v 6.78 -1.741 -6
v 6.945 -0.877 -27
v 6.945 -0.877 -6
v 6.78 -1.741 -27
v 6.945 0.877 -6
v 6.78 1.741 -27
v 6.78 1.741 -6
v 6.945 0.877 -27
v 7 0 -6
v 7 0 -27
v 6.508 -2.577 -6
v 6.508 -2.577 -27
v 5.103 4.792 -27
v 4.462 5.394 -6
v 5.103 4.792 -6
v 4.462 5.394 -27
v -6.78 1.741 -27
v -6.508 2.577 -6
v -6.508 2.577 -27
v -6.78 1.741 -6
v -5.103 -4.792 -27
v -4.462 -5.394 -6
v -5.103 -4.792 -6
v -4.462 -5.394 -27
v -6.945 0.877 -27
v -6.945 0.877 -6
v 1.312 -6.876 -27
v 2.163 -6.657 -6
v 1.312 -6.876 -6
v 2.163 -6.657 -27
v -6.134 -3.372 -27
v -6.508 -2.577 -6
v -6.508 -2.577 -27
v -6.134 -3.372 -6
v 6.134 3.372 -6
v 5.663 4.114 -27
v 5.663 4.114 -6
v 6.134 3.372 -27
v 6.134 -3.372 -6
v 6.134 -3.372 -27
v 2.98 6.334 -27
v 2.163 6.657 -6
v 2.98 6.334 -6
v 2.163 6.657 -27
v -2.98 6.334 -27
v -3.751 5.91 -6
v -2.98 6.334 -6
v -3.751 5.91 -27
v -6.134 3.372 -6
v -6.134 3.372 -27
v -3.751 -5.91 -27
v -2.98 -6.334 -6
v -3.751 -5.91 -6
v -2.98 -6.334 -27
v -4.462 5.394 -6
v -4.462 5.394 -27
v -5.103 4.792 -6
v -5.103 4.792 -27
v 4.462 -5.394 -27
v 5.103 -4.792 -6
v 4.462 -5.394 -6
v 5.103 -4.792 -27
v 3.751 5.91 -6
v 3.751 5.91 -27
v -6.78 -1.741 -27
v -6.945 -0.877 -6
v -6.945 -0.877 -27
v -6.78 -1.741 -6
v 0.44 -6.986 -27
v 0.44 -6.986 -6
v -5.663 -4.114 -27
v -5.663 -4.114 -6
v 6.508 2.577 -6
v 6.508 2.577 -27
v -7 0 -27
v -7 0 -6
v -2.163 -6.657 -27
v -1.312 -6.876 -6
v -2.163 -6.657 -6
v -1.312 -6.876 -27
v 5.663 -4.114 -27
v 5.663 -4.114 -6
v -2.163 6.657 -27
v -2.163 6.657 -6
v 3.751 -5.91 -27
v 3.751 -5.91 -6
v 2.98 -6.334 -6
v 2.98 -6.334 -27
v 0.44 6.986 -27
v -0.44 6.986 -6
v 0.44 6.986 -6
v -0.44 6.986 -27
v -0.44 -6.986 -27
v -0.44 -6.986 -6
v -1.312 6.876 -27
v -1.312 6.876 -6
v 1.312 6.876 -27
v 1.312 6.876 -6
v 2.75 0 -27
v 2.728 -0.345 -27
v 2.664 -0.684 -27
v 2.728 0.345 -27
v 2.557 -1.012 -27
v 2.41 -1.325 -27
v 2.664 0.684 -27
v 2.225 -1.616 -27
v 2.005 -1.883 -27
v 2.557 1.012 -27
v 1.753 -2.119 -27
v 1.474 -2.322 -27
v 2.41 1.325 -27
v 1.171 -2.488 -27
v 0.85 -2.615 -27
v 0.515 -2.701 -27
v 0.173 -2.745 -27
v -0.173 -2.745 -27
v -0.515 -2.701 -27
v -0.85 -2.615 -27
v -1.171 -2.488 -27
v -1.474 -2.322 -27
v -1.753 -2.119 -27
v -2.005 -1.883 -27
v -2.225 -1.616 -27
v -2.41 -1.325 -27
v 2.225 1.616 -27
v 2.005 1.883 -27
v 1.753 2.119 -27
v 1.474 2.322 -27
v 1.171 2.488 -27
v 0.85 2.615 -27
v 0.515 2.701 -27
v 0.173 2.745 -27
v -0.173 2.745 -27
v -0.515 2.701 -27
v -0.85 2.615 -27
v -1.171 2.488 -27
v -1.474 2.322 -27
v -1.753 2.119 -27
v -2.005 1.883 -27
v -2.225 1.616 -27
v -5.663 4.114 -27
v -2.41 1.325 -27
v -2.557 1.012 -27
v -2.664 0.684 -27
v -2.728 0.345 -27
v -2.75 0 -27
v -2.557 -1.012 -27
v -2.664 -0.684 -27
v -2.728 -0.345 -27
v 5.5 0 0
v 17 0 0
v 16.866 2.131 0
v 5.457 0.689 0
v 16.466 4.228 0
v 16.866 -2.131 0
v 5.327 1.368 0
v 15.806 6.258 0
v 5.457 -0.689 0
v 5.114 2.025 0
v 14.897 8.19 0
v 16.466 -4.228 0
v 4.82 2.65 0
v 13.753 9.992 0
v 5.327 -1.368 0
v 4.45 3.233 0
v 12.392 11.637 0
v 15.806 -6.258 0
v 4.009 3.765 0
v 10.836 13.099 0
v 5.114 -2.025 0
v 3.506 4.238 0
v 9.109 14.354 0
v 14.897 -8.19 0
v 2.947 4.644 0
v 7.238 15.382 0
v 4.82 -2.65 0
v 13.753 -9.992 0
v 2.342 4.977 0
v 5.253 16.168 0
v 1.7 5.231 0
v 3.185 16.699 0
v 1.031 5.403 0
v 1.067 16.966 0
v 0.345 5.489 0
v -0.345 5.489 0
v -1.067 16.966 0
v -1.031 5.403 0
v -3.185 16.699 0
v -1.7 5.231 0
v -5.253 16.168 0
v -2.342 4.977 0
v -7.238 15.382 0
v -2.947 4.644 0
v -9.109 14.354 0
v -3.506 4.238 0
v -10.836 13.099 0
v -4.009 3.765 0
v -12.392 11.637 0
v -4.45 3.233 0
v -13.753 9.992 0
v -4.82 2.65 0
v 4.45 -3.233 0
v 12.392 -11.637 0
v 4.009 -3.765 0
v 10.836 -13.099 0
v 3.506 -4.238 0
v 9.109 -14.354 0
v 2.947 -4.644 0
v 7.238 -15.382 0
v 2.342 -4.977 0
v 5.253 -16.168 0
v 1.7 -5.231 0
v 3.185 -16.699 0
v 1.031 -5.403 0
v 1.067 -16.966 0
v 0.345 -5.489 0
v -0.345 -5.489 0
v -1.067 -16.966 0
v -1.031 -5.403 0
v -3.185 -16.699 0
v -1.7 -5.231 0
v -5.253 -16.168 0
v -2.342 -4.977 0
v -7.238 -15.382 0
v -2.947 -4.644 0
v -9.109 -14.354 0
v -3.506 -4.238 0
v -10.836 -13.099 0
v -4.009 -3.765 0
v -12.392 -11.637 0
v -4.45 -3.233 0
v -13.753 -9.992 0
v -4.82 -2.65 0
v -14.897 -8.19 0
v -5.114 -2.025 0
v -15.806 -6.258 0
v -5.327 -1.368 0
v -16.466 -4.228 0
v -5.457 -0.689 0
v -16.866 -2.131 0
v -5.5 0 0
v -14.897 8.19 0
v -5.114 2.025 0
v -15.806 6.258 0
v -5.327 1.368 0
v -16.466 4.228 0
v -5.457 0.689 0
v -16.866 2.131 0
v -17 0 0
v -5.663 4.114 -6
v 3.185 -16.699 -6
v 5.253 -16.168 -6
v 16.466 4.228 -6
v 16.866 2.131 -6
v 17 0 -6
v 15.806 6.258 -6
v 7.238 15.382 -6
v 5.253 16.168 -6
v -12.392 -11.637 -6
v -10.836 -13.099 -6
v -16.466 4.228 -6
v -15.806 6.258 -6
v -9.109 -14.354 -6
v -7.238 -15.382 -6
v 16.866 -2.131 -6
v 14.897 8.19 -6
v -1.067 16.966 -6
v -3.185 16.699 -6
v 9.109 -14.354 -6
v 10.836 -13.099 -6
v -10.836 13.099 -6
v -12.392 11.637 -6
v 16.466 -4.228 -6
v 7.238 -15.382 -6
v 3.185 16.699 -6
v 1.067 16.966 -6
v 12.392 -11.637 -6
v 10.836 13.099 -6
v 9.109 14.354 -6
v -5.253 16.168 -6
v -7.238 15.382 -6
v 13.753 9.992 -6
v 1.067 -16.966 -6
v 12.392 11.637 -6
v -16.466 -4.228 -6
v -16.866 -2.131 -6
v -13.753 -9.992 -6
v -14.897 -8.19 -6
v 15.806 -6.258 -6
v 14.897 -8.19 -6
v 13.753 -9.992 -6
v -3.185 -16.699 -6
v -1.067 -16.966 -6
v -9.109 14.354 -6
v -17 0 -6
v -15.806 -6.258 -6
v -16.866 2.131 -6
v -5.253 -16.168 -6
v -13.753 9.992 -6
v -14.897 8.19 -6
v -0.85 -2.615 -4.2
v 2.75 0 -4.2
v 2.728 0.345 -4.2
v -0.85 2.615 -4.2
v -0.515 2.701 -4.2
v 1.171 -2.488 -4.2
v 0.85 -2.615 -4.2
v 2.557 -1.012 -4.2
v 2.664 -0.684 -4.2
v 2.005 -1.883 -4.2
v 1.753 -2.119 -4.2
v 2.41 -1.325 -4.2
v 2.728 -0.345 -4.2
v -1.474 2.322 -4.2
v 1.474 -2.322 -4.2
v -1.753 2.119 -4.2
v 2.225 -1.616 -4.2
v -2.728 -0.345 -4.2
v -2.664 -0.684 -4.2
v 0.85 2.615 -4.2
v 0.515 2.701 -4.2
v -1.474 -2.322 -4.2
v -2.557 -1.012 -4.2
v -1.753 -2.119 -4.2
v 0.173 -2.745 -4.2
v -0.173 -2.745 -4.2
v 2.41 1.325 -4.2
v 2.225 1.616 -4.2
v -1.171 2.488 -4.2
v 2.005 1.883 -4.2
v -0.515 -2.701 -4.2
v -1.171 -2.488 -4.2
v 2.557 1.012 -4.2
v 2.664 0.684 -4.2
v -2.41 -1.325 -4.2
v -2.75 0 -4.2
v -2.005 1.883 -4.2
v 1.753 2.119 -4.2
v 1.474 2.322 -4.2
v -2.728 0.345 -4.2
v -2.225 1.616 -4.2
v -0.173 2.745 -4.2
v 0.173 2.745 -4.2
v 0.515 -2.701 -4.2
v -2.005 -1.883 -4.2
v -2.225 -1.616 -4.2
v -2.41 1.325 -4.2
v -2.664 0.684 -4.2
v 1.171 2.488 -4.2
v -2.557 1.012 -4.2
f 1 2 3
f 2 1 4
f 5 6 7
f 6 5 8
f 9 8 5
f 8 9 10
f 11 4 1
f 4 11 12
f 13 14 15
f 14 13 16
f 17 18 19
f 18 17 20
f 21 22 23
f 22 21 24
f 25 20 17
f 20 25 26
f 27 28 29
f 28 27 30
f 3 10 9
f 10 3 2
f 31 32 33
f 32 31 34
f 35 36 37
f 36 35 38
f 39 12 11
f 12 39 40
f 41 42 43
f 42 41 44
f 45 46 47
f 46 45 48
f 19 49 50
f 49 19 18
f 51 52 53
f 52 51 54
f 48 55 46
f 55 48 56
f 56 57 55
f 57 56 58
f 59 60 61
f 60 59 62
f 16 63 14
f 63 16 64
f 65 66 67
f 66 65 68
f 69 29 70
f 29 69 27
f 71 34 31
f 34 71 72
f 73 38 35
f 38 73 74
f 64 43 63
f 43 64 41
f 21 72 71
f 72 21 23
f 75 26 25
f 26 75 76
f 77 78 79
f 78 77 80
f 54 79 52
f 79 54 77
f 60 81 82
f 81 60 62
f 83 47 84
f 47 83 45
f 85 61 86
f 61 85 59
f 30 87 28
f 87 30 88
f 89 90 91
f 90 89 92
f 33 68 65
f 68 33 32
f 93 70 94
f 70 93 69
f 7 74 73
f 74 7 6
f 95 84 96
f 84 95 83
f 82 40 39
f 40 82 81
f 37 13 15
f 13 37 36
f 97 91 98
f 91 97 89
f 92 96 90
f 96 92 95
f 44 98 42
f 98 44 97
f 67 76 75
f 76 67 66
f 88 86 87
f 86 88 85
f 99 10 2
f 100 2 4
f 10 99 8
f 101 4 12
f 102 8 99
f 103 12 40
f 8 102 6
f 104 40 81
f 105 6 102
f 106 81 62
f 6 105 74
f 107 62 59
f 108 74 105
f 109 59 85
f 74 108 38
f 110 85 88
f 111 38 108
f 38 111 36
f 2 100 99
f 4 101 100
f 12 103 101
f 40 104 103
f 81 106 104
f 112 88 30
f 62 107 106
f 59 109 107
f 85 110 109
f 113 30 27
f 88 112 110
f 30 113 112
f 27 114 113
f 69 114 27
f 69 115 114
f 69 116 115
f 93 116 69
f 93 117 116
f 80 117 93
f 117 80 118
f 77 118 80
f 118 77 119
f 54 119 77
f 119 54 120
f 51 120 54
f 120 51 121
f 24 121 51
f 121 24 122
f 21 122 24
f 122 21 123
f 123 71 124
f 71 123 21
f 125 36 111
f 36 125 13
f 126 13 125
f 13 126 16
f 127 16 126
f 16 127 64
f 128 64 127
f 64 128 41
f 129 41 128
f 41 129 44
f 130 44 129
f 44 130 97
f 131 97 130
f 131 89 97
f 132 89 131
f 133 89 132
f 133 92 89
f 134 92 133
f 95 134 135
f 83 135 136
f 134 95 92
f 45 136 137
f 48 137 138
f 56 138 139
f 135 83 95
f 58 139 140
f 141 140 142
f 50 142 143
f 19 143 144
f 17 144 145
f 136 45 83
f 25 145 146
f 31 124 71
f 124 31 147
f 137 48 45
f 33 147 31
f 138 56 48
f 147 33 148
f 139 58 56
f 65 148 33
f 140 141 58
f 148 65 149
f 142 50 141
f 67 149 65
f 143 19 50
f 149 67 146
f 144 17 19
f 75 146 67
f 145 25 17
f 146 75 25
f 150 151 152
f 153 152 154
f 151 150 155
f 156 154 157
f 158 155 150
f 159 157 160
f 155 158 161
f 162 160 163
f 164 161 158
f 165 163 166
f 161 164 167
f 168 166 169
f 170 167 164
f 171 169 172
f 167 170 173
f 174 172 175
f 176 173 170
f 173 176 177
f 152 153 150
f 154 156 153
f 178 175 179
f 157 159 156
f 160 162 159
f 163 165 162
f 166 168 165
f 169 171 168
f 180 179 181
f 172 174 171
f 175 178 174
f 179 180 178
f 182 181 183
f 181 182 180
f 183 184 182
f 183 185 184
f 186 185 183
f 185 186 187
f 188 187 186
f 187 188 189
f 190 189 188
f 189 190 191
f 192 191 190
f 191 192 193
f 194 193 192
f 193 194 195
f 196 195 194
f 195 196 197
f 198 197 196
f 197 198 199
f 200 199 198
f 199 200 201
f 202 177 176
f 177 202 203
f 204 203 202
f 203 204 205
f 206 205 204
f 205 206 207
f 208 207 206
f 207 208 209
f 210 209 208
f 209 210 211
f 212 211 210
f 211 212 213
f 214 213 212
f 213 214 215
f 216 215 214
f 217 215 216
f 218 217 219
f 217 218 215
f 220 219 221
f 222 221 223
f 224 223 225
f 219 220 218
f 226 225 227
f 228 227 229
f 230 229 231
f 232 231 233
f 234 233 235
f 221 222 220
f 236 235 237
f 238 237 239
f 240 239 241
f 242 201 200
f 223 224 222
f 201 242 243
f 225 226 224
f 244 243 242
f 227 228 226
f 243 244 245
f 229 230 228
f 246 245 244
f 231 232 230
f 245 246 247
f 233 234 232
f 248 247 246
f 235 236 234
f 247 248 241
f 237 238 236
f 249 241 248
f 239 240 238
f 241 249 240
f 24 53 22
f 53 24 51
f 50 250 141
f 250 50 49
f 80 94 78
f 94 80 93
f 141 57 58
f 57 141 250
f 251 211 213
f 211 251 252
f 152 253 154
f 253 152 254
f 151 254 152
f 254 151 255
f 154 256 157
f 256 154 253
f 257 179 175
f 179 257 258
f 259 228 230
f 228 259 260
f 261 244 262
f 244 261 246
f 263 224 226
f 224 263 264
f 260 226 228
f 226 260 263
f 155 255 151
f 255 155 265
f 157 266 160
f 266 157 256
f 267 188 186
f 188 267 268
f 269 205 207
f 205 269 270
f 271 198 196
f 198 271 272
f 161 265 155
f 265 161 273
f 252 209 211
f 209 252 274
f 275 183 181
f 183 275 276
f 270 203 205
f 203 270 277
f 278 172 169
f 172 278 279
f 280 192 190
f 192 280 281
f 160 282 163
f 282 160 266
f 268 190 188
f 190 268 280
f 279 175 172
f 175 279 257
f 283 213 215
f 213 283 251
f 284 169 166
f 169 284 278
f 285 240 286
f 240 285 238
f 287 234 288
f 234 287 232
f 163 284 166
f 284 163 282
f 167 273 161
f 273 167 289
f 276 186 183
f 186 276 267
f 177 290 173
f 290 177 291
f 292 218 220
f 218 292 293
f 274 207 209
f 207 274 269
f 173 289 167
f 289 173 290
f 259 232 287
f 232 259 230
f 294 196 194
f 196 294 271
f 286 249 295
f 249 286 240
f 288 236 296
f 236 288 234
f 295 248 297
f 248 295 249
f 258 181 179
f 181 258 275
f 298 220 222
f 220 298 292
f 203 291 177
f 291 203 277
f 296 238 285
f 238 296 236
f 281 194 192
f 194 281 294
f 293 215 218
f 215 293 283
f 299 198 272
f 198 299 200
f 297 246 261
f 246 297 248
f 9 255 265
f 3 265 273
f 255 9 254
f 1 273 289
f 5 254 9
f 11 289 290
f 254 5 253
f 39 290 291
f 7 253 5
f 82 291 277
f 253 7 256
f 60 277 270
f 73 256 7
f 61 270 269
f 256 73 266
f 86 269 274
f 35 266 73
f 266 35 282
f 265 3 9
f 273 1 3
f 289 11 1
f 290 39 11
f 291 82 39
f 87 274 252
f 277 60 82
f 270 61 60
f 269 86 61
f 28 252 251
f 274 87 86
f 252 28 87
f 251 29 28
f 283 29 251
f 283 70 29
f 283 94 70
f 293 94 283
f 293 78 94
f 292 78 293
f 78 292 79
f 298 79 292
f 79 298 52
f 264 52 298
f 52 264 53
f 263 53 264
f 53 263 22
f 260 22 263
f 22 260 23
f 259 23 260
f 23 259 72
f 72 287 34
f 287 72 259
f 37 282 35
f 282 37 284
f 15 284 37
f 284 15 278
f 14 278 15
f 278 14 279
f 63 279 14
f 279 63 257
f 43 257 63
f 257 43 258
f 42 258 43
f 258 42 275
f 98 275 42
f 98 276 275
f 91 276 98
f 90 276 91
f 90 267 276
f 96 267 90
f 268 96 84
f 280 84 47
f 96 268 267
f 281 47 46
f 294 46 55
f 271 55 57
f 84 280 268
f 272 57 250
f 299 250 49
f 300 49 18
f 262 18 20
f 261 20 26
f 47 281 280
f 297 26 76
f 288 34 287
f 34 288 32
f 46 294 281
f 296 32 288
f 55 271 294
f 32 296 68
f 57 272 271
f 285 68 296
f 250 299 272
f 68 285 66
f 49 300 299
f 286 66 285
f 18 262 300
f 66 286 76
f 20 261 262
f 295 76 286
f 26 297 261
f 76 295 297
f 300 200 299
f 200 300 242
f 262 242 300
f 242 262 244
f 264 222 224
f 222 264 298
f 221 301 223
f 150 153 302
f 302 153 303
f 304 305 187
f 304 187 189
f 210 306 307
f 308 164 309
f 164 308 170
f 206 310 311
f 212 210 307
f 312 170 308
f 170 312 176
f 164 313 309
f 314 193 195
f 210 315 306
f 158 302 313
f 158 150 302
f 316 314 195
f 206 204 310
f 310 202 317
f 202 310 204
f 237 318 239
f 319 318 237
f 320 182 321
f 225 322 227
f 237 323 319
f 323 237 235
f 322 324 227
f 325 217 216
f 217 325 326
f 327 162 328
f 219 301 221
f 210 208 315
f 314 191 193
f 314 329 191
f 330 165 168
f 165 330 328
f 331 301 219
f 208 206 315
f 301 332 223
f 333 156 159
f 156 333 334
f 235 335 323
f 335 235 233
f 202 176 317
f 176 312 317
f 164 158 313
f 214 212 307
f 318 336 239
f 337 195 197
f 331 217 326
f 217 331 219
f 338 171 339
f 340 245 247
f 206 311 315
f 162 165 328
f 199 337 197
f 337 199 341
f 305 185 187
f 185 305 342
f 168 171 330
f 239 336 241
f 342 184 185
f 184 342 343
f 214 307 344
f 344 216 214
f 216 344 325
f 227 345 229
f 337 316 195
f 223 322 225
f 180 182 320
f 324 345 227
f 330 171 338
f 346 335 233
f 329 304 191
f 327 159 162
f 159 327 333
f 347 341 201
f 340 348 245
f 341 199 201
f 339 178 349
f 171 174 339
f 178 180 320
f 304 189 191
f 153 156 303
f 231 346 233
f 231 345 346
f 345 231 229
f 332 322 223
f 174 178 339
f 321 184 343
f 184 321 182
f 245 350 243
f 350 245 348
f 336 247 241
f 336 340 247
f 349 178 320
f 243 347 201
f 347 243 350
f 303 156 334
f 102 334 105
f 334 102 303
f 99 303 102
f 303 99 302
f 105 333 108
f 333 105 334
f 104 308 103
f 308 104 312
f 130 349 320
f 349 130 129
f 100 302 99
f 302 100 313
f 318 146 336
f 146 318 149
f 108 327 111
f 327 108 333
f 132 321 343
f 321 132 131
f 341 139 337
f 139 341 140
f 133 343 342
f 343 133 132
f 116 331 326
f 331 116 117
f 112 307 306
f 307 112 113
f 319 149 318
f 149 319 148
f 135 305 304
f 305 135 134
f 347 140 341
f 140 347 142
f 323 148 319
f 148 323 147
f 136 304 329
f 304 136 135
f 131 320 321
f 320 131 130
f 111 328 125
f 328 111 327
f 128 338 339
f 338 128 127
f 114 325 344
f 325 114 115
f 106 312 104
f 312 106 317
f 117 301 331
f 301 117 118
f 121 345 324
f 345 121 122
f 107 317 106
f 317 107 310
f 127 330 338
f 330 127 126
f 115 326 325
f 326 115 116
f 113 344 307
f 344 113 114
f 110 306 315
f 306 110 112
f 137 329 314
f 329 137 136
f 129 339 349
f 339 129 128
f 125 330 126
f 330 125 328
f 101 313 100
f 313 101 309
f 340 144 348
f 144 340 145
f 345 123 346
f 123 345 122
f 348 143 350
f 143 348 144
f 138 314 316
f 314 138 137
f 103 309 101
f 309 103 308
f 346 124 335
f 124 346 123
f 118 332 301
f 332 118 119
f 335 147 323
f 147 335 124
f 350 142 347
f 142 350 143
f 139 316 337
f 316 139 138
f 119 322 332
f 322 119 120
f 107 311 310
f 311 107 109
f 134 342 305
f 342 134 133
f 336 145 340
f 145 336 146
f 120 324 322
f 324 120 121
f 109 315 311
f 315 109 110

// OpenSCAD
$fn = 50;


difference() {
	union() {
		translate(v = [0, 0, -27.0000000000]) {
			cylinder(h = 27, r = 7.0000000000);
		}
		translate(v = [0, 0, -6.0000000000]) {
			cylinder(h = 6, r = 17.0000000000);
		}
	}
	union() {
		translate(v = [0, 0, 0]) {
			rotate(a = [0, 0, 0]) {
				difference() {
					union() {
						#translate(v = [0, 0, -27.0000000000]) {
							cylinder(h = 27, r = 2.2500000000);
						}
						#translate(v = [0, 0, -4.2000000000]) {
							cylinder(h = 4.2000000000, r = 7.0000000000, r1 = 2.7500000000, r2 = 5.5000000000);
						}
						#translate(v = [0, 0, -27.0000000000]) {
							cylinder(h = 27, r = 2.7500000000);
						}
						#translate(v = [0, 0, -27.0000000000]) {
							cylinder(h = 27, r = 2.2500000000);
						}
					}
					union();
				}
			}
		}
	}
}
